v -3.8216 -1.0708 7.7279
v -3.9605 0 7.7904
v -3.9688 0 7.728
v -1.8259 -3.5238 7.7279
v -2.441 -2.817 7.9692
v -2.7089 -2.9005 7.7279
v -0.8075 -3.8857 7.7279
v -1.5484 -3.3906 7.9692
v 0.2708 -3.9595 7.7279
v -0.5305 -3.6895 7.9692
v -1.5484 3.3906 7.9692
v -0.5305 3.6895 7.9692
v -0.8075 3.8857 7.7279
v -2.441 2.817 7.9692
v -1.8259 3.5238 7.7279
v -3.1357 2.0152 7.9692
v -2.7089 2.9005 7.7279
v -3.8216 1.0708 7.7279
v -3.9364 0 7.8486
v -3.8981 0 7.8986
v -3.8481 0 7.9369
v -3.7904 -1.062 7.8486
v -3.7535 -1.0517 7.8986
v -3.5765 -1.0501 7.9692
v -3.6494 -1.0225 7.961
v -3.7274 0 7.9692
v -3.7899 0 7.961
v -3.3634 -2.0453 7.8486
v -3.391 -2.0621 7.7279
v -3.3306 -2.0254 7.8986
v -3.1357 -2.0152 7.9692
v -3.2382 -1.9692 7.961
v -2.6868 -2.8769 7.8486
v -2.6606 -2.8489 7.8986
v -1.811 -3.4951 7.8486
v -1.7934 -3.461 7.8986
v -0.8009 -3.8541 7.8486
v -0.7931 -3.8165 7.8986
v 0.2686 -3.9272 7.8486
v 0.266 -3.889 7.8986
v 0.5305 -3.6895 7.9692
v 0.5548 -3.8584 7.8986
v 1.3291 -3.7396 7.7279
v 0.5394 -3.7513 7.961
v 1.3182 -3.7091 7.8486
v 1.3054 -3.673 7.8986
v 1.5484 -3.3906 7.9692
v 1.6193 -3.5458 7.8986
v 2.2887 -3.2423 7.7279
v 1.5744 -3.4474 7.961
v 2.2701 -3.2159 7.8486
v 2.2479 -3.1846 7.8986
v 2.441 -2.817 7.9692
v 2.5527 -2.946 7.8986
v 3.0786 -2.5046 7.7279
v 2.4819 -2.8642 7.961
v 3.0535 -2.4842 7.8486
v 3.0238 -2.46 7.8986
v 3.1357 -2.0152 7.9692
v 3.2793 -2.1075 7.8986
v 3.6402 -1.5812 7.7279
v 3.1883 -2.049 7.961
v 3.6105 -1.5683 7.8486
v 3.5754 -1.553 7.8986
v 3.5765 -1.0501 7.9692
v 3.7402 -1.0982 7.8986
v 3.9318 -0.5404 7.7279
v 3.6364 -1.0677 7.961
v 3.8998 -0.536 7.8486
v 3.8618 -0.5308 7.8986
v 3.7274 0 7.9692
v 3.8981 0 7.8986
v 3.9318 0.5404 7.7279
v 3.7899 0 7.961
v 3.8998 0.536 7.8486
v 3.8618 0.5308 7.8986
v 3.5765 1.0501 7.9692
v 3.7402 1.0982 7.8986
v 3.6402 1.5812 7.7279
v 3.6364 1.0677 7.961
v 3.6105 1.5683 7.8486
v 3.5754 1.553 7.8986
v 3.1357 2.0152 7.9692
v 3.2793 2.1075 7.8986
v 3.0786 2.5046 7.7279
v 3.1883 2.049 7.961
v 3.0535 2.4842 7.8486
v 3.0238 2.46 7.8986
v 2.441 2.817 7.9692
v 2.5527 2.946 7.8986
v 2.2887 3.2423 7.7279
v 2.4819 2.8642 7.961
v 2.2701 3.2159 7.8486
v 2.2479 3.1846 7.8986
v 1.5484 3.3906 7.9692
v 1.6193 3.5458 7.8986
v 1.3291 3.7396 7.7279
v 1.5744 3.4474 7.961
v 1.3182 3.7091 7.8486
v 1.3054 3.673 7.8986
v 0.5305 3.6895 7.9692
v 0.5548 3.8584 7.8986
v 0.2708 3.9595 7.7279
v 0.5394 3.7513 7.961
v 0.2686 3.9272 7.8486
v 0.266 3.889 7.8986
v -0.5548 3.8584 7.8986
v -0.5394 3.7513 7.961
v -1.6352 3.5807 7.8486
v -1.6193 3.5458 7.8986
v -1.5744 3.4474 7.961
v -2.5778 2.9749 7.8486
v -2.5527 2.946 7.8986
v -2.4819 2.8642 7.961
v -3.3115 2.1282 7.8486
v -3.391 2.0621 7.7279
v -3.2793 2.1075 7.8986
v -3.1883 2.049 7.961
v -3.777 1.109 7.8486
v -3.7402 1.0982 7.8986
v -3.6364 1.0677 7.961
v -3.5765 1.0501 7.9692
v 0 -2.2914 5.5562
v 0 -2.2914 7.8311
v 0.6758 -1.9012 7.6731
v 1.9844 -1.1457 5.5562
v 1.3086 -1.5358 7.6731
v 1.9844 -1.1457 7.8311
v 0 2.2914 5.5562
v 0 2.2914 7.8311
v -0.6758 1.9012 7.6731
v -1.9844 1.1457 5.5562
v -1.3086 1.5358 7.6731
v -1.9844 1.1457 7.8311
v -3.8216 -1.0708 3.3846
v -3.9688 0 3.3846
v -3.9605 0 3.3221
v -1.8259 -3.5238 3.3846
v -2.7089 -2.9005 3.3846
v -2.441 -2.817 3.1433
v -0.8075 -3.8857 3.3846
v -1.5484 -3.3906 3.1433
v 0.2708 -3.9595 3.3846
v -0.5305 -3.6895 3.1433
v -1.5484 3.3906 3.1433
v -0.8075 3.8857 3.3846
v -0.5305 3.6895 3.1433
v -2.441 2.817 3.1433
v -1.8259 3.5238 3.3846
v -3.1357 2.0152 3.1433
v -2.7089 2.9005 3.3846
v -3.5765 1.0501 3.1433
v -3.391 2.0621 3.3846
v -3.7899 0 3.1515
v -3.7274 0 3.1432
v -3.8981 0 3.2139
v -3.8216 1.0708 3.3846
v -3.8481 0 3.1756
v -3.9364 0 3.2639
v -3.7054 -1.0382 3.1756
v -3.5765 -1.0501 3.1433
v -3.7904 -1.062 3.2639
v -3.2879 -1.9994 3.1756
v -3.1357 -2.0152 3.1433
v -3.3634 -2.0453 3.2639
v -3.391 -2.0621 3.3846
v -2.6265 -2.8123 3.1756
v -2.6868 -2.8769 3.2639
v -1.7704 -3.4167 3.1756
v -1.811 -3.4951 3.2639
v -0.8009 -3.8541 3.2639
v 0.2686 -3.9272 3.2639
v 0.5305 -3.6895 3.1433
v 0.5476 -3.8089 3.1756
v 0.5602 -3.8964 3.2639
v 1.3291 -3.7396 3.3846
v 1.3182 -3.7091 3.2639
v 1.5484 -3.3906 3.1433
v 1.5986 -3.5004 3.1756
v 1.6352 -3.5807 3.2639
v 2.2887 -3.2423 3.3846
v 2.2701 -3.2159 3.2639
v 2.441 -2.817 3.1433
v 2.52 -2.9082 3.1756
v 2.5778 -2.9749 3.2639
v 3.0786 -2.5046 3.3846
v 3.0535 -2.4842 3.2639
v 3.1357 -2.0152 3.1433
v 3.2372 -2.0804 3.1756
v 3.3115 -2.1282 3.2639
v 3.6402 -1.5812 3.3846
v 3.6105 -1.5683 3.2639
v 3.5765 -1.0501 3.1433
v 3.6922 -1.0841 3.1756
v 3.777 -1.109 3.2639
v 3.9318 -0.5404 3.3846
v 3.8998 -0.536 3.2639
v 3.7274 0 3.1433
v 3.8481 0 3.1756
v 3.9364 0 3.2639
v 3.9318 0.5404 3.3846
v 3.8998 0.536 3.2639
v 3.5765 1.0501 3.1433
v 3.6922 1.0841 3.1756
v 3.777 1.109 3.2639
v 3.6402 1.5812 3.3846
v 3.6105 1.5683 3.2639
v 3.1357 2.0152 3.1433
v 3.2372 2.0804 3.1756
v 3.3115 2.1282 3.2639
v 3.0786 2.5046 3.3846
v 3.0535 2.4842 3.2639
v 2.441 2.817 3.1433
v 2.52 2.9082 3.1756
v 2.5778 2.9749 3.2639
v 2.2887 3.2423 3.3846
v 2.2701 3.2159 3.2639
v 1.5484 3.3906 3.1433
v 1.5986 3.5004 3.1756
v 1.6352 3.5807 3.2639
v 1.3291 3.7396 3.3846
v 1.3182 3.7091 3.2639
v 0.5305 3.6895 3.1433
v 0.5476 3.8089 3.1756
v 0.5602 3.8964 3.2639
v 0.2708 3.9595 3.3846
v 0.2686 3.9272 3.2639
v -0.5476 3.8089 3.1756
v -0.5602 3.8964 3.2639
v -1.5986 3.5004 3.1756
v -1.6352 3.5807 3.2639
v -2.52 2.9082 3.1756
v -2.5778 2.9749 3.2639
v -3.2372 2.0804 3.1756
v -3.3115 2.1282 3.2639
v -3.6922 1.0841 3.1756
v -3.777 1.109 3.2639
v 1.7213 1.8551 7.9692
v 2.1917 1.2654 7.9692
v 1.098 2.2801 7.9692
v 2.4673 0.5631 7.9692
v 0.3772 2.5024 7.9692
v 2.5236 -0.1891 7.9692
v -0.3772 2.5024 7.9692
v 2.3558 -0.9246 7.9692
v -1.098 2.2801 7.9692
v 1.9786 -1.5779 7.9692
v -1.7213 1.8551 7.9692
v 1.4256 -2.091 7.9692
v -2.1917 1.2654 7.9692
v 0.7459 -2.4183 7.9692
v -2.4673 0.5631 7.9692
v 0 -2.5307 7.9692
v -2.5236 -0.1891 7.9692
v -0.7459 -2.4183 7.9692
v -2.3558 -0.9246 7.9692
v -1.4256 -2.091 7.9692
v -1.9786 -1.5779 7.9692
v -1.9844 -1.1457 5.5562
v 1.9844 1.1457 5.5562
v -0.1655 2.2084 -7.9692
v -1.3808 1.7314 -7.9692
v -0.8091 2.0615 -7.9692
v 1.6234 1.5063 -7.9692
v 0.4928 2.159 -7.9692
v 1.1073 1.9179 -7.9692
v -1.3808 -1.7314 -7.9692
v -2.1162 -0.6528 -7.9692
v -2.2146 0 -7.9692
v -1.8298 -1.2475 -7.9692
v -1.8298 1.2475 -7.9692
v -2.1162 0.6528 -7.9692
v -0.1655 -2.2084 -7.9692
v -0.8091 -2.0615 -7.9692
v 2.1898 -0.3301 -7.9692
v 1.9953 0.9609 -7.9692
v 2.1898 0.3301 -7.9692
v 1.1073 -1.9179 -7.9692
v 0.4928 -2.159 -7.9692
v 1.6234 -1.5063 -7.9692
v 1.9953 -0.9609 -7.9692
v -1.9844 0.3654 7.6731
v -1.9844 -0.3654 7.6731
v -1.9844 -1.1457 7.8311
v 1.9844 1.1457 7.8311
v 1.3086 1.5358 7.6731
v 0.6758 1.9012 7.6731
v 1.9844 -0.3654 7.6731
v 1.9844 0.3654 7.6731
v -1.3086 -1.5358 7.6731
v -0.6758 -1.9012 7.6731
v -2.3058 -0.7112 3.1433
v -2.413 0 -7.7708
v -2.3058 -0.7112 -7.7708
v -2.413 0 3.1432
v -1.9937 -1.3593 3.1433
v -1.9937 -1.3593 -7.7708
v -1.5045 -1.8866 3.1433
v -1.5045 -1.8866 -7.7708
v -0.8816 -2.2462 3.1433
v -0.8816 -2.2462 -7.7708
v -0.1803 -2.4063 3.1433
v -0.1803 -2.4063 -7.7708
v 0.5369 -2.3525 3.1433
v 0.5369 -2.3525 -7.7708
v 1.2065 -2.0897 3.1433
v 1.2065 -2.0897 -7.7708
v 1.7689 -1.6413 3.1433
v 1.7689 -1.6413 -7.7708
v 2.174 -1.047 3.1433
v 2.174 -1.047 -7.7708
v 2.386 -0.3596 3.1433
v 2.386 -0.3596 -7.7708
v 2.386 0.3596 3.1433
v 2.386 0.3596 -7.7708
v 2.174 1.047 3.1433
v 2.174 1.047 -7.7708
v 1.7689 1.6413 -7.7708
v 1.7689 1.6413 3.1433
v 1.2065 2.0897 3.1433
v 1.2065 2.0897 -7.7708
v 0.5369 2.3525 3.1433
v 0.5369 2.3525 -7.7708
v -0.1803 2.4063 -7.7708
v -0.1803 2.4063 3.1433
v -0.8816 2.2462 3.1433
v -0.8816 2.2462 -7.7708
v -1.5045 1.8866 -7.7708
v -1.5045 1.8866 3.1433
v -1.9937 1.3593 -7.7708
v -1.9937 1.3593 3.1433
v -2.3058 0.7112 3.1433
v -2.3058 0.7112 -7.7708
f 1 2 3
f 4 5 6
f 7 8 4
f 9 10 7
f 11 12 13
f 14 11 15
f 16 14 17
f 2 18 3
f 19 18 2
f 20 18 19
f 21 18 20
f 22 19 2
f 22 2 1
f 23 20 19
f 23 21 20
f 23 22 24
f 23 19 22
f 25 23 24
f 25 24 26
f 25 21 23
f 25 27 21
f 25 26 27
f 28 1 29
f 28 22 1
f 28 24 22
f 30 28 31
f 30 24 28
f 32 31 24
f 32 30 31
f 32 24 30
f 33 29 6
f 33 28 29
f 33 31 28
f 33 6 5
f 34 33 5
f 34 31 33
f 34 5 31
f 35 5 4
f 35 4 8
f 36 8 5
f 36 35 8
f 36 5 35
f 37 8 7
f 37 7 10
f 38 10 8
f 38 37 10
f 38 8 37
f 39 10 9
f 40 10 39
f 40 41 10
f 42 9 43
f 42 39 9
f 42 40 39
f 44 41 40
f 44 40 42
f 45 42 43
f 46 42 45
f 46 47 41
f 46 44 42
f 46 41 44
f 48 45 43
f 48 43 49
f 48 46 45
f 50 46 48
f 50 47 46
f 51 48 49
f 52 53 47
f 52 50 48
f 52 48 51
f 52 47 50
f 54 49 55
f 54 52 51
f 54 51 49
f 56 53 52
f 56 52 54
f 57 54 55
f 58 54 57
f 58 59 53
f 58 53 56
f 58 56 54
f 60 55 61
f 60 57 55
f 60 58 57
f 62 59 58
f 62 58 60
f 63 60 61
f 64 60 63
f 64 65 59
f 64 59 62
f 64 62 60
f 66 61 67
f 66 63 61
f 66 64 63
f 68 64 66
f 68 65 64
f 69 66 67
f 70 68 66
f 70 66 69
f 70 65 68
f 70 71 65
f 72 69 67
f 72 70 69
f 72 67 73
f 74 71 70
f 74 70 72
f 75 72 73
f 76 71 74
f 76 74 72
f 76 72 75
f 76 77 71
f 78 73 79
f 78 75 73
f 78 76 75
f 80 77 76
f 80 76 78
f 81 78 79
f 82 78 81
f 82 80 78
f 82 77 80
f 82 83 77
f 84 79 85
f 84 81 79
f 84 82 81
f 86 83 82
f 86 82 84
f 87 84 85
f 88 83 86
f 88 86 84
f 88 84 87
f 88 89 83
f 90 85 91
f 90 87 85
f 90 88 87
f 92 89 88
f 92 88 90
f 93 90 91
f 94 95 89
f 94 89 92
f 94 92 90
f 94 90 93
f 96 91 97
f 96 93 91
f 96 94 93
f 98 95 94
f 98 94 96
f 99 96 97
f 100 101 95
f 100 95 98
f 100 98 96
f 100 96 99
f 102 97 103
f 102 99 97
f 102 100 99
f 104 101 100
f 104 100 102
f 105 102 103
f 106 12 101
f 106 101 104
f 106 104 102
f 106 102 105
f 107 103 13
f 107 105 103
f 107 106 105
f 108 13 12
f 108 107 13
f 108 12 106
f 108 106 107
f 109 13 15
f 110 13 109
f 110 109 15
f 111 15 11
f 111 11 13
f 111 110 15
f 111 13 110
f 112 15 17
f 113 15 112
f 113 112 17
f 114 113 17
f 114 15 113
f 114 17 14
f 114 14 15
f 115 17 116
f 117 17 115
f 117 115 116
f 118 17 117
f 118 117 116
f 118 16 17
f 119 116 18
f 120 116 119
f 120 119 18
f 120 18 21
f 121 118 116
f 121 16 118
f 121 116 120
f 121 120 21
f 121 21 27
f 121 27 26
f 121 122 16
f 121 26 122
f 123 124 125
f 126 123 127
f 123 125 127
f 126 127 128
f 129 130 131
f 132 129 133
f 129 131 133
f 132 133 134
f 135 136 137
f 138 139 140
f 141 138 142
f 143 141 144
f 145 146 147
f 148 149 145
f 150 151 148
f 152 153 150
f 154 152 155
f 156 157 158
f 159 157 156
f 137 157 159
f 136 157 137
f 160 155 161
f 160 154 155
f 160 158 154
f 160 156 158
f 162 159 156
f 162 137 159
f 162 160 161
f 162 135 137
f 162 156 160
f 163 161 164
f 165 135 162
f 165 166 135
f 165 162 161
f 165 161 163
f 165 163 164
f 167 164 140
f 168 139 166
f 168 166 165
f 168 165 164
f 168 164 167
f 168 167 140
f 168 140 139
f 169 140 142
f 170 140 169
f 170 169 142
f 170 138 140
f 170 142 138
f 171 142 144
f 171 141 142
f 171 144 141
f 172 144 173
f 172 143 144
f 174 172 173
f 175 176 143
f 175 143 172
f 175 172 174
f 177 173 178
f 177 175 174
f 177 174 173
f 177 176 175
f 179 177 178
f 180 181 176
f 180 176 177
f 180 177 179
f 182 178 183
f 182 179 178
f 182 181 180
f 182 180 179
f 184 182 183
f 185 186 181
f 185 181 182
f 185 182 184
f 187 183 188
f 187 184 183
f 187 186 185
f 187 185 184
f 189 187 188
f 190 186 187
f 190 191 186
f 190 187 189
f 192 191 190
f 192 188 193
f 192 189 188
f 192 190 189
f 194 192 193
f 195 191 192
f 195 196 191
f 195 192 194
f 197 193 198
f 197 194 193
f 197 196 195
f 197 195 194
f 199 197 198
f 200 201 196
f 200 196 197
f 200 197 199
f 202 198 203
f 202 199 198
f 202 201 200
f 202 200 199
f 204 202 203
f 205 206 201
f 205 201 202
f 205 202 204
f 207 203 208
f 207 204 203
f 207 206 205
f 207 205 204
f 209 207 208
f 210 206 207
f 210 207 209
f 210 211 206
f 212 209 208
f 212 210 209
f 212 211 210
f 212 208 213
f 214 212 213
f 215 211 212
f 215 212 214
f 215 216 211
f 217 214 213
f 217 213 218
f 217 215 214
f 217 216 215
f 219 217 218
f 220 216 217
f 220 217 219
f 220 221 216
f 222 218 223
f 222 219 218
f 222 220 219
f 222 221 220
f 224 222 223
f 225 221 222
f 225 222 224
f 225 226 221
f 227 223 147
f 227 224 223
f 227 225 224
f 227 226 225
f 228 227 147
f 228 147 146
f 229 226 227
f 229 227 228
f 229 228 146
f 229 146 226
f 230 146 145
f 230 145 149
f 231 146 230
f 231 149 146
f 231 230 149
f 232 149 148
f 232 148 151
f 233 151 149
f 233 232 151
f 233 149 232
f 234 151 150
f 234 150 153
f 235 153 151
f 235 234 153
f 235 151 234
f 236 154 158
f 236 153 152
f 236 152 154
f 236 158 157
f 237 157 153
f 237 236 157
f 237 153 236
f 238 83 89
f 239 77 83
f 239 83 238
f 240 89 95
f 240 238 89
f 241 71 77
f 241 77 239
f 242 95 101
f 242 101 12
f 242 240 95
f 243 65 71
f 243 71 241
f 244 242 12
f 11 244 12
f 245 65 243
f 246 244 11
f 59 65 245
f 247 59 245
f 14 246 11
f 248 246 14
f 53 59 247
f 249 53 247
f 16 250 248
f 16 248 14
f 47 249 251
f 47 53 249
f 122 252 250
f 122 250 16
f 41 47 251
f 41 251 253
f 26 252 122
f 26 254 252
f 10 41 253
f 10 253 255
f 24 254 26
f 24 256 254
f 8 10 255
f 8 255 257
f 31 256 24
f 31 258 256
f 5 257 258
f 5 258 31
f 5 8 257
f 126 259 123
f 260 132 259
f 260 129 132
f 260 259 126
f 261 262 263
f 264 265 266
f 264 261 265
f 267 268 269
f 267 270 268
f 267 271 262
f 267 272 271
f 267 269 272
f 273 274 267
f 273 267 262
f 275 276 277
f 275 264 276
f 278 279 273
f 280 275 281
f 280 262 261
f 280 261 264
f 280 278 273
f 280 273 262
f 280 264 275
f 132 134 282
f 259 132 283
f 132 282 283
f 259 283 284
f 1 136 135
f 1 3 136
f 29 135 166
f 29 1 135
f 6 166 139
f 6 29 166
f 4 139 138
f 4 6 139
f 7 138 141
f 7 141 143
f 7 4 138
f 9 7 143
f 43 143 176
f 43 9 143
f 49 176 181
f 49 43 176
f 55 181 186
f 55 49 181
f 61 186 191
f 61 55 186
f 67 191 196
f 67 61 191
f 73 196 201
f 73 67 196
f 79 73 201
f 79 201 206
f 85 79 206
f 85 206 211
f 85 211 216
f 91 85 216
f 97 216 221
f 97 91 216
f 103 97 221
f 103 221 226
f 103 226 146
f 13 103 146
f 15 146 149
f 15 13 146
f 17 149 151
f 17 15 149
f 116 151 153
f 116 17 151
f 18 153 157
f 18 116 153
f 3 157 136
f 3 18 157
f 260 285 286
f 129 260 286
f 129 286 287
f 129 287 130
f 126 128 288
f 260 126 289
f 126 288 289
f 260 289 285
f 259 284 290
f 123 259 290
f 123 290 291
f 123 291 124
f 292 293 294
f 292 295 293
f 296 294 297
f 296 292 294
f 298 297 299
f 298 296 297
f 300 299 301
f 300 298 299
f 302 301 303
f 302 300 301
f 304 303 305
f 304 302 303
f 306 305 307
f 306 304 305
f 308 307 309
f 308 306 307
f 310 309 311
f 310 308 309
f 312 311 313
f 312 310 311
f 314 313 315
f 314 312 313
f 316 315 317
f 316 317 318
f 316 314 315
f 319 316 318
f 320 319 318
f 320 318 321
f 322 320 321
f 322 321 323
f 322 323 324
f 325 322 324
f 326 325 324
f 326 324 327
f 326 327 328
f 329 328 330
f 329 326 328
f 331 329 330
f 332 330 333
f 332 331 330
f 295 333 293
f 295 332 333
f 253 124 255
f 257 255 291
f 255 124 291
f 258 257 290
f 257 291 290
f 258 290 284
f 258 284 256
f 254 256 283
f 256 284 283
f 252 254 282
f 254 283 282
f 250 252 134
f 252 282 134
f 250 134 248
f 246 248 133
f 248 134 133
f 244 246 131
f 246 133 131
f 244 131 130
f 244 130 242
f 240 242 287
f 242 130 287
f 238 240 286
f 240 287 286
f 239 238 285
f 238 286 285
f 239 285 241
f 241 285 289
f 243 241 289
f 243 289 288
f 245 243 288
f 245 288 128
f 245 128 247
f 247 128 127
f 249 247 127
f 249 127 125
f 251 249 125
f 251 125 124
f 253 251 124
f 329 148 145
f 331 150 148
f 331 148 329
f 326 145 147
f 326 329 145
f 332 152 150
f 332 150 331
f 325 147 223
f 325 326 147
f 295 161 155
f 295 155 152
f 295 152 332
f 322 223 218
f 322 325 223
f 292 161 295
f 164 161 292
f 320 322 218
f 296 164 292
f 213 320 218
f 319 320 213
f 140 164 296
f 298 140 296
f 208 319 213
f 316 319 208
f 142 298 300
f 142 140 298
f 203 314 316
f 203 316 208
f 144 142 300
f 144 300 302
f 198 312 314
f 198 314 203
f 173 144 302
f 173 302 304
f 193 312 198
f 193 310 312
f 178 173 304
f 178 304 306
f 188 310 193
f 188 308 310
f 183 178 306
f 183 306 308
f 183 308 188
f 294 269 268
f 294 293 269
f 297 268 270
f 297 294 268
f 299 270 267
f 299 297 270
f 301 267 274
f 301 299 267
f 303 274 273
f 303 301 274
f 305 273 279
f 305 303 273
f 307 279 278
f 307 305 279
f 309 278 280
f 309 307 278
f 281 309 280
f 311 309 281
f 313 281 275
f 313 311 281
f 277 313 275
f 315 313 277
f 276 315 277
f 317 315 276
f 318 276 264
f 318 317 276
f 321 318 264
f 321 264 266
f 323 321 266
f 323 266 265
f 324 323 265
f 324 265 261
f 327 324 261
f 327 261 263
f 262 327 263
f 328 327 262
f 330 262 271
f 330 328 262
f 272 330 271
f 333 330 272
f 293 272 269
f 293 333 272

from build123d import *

# Parameters (mm, degrees)
CUT_EXTRUDE1_START = 7.96925
CUT_EXTRUDE1_DEPTH = 2.413


with BuildPart() as part:
    # Sketch2 → Revolve1 (revolve)
    with BuildSketch(Plane(origin=(0, 0, 0), x_dir=(0, 0, -1), z_dir=(1, 0, 0)), mode=Mode.PRIVATE) as revolve1_sk:
        with BuildLine():
            Line((7.96925, 0), (7.96925, 2.2145625))
            Line((7.96925, 2.2145625), (7.7708125, 2.413))
            Line((7.7708125, 2.413), (-3.14325, 2.413))
            Line((-3.14325, 2.413), (-3.14325, 3.72745))
            ThreePointArc((-3.14325, 3.72745), (-3.213925134, 3.898074866), (-3.38455, 3.96875))
            Line((-3.38455, 3.96875), (-7.72795, 3.96875))
            ThreePointArc((-7.72795, 3.96875), (-7.898574866, 3.898074866), (-7.96925, 3.72745))
            Line((-7.96925, 3.72745), (-7.96925, 0))
            Line((-7.96925, 0), (7.96925, 0))
        make_face()
    revolve(revolve1_sk.sketch.rotate(Axis((0, 0, -7.96925), (0, 0, 1)), 90), axis=Axis((0, 0, -7.96925), (0, 0, 1)))

    # Sketch3 → Cut-Extrude1 (cut)
    with BuildSketch(Plane.XY.offset(CUT_EXTRUDE1_START)):
        Polygon((-1.984375, 1.14567944), (-1.984375, -1.14567944), (0, -2.291358881), (1.984375, -1.14567944), (1.984375, 1.14567944), (0, 2.291358881), align=None)
    extrude(amount=-CUT_EXTRUDE1_DEPTH, mode=Mode.SUBTRACT)

    # Cut-Extrude2 cone 1 section (through the dimple's axis) → Cut-Extrude2 (revolve, cut)
    with BuildSketch(Plane(origin=(0, 0, 7.96925), x_dir=(0, -1, 0), z_dir=(1, 0, 0))):
        Polygon((0, 0), (2.530707401, 0), (0, 1.461104599), align=None)
    revolve(axis=Axis((0, 0, 7.96925), (0, 0, -1)), mode=Mode.SUBTRACT)


solid = part.part
